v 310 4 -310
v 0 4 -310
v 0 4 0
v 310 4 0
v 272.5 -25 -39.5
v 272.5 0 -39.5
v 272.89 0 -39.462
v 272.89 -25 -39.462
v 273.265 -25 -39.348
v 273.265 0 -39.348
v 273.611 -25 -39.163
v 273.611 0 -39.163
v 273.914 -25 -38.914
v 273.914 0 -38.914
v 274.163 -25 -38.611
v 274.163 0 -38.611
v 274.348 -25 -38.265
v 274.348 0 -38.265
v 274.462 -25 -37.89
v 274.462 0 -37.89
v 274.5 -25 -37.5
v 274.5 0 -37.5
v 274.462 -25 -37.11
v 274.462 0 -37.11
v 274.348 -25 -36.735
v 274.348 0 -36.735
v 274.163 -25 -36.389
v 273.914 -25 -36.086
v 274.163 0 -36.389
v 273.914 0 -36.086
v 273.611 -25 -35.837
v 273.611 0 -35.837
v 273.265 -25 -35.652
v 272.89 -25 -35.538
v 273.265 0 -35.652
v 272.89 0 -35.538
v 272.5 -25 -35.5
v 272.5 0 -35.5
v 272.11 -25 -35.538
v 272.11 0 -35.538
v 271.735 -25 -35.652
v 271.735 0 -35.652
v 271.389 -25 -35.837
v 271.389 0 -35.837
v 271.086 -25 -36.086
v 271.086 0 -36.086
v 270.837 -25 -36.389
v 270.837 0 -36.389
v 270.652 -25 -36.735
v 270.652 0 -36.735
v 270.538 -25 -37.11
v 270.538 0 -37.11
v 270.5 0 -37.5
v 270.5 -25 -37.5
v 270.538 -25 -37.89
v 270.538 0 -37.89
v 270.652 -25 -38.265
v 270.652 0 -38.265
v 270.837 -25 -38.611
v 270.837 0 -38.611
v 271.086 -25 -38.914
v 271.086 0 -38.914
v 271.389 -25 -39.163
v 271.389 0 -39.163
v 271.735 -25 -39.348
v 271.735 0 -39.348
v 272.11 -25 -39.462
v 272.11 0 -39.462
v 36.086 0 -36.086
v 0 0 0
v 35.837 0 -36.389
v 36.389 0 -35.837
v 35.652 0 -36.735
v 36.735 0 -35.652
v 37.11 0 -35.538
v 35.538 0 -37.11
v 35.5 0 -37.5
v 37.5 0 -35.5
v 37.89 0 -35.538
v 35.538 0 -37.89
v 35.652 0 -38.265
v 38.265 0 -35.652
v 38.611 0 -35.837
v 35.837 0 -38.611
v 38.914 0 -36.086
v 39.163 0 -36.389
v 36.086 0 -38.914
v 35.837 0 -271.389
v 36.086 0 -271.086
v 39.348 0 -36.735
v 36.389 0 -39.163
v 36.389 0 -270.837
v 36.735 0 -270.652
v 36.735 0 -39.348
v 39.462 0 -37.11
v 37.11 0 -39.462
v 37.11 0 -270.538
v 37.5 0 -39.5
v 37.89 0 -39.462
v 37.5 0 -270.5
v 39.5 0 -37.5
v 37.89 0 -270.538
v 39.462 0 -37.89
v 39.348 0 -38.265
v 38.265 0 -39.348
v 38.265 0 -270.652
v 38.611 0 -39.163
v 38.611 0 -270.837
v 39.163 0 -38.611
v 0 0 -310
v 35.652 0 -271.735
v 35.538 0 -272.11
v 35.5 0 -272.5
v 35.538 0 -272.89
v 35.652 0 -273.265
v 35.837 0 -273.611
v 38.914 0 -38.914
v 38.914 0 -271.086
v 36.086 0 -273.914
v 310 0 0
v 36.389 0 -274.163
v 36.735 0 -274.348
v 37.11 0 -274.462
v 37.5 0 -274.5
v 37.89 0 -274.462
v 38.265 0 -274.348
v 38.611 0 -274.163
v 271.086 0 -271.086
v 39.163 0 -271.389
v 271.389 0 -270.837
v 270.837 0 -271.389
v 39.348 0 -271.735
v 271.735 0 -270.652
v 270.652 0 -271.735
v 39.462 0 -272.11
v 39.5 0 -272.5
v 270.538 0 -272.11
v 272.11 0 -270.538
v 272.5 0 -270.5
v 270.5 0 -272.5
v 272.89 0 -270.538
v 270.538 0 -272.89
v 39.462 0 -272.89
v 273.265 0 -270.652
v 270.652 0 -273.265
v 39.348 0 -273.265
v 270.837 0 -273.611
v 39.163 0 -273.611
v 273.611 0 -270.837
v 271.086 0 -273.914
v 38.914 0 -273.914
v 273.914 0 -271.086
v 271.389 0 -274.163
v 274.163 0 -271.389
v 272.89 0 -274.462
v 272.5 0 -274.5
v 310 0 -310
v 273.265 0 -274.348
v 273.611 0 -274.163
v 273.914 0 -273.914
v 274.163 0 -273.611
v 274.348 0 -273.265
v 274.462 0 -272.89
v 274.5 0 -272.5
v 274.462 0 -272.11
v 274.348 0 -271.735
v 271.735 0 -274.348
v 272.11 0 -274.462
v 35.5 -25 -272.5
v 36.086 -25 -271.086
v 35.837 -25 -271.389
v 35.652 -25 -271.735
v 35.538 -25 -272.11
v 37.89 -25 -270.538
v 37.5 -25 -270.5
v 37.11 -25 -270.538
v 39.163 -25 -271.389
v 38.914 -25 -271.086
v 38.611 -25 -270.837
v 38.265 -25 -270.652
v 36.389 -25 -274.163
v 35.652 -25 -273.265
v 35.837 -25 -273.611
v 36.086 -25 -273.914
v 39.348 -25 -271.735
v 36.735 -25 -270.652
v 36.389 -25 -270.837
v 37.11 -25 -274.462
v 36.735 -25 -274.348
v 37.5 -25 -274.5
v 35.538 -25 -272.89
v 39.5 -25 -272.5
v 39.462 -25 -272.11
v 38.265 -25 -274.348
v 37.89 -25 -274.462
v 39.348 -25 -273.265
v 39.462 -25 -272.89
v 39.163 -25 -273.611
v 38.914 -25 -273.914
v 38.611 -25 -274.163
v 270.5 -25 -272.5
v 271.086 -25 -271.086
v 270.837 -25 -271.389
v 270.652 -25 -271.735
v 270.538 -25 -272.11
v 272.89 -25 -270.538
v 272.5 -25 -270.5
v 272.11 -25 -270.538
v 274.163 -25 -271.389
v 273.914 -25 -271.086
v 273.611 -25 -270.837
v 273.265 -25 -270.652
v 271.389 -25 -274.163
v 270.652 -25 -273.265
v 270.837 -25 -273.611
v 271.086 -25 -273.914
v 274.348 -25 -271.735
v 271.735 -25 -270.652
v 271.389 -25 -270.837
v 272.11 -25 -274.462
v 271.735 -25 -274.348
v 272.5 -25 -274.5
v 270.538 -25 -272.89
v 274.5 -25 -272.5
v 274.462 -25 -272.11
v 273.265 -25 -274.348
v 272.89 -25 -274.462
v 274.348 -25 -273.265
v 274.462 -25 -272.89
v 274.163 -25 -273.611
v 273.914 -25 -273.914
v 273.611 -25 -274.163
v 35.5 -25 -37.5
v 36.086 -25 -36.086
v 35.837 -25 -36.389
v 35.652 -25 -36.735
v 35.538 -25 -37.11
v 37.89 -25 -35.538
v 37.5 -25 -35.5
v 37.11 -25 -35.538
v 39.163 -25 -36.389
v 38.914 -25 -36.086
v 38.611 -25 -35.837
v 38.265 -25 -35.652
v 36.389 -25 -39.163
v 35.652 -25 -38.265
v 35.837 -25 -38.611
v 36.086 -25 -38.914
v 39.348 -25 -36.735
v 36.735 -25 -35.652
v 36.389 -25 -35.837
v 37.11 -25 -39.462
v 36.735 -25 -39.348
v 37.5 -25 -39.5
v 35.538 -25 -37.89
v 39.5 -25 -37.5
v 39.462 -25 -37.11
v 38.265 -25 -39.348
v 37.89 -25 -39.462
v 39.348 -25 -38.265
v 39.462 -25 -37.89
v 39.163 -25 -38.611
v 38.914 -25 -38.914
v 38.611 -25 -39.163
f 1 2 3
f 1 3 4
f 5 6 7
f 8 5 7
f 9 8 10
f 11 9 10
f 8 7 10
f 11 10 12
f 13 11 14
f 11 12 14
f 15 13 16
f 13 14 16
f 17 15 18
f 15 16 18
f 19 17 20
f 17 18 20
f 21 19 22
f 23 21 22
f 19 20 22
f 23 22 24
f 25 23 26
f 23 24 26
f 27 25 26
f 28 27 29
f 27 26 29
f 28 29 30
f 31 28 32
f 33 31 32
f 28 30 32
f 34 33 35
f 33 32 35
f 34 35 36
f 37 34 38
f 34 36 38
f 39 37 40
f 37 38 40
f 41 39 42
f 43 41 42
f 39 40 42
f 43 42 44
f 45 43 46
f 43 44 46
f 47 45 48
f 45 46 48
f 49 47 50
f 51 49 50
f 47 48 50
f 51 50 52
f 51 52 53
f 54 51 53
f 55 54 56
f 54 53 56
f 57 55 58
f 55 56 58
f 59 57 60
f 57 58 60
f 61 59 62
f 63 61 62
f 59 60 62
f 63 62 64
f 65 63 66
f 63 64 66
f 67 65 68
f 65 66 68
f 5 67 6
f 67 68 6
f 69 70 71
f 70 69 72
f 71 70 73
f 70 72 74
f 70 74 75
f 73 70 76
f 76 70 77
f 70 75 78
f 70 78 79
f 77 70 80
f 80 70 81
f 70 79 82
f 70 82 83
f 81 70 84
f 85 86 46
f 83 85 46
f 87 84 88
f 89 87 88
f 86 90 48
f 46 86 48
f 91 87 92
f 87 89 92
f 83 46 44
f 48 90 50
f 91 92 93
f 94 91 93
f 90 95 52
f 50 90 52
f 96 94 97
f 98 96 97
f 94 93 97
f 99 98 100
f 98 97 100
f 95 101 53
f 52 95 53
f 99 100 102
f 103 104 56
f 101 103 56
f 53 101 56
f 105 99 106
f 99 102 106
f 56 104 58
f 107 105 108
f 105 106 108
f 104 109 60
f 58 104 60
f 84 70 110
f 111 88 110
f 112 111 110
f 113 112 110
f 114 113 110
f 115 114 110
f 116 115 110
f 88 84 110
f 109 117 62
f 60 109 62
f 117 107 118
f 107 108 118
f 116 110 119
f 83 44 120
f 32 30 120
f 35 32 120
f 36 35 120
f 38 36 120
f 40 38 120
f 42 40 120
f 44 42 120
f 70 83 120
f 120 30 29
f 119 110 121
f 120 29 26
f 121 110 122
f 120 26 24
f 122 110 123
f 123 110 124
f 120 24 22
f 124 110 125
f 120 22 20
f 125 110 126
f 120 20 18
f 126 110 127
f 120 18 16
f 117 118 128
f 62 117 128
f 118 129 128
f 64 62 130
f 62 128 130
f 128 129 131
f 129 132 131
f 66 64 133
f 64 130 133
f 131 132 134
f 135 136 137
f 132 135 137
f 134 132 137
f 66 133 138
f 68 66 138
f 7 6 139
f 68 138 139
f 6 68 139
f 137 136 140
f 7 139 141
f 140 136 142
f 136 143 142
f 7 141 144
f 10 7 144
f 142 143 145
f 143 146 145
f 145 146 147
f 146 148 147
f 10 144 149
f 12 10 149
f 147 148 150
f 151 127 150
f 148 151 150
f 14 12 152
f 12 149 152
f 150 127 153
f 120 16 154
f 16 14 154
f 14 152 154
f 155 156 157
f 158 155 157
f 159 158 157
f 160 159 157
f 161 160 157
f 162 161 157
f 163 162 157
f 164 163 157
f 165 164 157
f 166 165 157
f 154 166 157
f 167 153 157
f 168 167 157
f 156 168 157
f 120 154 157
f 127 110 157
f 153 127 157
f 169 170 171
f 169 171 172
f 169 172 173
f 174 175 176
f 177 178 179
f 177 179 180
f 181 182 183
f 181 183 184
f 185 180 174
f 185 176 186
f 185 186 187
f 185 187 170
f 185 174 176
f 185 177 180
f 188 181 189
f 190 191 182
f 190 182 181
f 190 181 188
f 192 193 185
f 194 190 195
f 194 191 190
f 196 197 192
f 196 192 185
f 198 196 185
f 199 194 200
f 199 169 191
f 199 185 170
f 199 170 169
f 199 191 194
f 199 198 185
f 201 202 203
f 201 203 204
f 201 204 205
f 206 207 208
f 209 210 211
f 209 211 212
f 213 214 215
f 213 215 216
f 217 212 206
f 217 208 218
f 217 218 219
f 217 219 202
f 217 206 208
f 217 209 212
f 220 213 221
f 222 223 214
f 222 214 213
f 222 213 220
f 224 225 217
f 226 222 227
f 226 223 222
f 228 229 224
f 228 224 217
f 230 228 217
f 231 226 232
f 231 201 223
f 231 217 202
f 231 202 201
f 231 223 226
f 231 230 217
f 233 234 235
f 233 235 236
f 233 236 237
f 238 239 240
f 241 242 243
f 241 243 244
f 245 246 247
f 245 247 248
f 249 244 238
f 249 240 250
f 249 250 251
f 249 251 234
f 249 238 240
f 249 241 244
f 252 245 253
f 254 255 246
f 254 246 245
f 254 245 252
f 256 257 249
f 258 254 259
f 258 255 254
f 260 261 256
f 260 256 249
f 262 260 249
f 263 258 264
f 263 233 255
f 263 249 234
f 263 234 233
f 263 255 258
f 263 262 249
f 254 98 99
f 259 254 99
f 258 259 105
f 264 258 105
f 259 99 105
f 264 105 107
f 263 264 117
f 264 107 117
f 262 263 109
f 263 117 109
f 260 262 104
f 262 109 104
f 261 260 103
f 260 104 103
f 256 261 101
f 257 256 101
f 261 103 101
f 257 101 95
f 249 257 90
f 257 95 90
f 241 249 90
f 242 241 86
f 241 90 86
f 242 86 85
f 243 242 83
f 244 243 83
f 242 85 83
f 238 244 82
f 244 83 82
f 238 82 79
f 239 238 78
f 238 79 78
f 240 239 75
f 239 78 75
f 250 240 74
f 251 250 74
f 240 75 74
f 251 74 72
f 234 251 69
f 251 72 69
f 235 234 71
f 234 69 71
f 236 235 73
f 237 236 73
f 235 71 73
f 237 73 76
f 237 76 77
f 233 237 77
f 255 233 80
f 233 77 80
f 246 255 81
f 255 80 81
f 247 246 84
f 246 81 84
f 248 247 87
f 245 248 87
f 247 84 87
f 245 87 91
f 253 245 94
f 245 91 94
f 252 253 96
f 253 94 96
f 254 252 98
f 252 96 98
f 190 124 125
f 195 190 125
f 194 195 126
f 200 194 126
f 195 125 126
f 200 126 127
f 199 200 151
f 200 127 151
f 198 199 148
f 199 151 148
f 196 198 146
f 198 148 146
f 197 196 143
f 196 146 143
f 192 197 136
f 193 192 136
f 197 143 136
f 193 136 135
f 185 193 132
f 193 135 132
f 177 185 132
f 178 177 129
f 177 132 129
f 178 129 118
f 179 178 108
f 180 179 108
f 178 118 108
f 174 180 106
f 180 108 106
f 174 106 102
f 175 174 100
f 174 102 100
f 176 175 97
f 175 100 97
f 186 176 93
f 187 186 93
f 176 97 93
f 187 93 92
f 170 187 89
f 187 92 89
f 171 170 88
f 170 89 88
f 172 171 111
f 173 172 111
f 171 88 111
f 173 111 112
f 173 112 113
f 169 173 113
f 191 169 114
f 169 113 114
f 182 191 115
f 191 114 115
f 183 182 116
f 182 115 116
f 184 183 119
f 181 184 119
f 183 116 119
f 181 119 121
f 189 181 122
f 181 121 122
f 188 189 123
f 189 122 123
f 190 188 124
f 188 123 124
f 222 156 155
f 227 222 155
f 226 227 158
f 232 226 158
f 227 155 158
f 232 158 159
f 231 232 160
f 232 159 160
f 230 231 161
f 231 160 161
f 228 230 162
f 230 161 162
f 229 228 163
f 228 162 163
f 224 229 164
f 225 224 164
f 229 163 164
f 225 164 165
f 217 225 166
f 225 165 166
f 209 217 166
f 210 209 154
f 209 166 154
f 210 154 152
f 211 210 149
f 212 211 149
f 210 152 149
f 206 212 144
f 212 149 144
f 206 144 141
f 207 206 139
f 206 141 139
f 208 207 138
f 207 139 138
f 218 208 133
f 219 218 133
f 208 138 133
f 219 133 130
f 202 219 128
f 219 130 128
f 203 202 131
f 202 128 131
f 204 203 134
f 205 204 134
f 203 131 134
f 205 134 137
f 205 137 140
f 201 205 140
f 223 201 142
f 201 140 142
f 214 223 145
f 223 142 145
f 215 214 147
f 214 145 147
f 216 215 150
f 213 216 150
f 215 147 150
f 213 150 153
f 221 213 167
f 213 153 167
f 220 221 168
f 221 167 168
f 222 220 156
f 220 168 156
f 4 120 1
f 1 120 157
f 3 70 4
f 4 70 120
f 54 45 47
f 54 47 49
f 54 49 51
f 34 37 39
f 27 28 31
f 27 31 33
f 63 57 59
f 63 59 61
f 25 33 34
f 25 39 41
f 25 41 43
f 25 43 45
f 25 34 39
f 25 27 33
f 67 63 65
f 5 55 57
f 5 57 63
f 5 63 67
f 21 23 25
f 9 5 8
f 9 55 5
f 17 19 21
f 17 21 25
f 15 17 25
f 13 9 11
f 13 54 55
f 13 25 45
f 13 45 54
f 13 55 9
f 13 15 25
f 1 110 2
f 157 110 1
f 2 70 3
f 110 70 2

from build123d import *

# Parameters (mm, degrees)
SKETCH_1_W      = 310
SKETCH_1_H      = 310
EXTRUDE_1_DEPTH = 4
SKETCH_2_R      = 2
EXTRUDE_2_DEPTH = 25


with BuildPart() as part:
    # Эскиз1 → Бобышка-Вытянуть1 (new body)
    with BuildSketch(Plane(origin=(0, 0, 0), x_dir=(1, 0, 0), z_dir=(0, 1, 0))):
        with Locations((155, 155)):
            Rectangle(SKETCH_1_W, SKETCH_1_H)
    extrude(amount=EXTRUDE_1_DEPTH)

    # Эскиз2 → Бобышка-Вытянуть2 (add)
    with BuildSketch(Plane.XZ):
        with Locations(Location((272.5, -37.5, 0), (0, 0, 270))):
            Circle(SKETCH_2_R)
        with Locations(Location((272.5, -272.5, 0), (0, 0, 270))):
            Circle(SKETCH_2_R)
        with Locations(Location((37.5, -37.5, 0), (0, 0, 270))):
            Circle(SKETCH_2_R)
        with Locations(Location((37.5, -272.5, 0), (0, 0, 270))):
            Circle(SKETCH_2_R)
    extrude(amount=EXTRUDE_2_DEPTH)


solid = part.part
